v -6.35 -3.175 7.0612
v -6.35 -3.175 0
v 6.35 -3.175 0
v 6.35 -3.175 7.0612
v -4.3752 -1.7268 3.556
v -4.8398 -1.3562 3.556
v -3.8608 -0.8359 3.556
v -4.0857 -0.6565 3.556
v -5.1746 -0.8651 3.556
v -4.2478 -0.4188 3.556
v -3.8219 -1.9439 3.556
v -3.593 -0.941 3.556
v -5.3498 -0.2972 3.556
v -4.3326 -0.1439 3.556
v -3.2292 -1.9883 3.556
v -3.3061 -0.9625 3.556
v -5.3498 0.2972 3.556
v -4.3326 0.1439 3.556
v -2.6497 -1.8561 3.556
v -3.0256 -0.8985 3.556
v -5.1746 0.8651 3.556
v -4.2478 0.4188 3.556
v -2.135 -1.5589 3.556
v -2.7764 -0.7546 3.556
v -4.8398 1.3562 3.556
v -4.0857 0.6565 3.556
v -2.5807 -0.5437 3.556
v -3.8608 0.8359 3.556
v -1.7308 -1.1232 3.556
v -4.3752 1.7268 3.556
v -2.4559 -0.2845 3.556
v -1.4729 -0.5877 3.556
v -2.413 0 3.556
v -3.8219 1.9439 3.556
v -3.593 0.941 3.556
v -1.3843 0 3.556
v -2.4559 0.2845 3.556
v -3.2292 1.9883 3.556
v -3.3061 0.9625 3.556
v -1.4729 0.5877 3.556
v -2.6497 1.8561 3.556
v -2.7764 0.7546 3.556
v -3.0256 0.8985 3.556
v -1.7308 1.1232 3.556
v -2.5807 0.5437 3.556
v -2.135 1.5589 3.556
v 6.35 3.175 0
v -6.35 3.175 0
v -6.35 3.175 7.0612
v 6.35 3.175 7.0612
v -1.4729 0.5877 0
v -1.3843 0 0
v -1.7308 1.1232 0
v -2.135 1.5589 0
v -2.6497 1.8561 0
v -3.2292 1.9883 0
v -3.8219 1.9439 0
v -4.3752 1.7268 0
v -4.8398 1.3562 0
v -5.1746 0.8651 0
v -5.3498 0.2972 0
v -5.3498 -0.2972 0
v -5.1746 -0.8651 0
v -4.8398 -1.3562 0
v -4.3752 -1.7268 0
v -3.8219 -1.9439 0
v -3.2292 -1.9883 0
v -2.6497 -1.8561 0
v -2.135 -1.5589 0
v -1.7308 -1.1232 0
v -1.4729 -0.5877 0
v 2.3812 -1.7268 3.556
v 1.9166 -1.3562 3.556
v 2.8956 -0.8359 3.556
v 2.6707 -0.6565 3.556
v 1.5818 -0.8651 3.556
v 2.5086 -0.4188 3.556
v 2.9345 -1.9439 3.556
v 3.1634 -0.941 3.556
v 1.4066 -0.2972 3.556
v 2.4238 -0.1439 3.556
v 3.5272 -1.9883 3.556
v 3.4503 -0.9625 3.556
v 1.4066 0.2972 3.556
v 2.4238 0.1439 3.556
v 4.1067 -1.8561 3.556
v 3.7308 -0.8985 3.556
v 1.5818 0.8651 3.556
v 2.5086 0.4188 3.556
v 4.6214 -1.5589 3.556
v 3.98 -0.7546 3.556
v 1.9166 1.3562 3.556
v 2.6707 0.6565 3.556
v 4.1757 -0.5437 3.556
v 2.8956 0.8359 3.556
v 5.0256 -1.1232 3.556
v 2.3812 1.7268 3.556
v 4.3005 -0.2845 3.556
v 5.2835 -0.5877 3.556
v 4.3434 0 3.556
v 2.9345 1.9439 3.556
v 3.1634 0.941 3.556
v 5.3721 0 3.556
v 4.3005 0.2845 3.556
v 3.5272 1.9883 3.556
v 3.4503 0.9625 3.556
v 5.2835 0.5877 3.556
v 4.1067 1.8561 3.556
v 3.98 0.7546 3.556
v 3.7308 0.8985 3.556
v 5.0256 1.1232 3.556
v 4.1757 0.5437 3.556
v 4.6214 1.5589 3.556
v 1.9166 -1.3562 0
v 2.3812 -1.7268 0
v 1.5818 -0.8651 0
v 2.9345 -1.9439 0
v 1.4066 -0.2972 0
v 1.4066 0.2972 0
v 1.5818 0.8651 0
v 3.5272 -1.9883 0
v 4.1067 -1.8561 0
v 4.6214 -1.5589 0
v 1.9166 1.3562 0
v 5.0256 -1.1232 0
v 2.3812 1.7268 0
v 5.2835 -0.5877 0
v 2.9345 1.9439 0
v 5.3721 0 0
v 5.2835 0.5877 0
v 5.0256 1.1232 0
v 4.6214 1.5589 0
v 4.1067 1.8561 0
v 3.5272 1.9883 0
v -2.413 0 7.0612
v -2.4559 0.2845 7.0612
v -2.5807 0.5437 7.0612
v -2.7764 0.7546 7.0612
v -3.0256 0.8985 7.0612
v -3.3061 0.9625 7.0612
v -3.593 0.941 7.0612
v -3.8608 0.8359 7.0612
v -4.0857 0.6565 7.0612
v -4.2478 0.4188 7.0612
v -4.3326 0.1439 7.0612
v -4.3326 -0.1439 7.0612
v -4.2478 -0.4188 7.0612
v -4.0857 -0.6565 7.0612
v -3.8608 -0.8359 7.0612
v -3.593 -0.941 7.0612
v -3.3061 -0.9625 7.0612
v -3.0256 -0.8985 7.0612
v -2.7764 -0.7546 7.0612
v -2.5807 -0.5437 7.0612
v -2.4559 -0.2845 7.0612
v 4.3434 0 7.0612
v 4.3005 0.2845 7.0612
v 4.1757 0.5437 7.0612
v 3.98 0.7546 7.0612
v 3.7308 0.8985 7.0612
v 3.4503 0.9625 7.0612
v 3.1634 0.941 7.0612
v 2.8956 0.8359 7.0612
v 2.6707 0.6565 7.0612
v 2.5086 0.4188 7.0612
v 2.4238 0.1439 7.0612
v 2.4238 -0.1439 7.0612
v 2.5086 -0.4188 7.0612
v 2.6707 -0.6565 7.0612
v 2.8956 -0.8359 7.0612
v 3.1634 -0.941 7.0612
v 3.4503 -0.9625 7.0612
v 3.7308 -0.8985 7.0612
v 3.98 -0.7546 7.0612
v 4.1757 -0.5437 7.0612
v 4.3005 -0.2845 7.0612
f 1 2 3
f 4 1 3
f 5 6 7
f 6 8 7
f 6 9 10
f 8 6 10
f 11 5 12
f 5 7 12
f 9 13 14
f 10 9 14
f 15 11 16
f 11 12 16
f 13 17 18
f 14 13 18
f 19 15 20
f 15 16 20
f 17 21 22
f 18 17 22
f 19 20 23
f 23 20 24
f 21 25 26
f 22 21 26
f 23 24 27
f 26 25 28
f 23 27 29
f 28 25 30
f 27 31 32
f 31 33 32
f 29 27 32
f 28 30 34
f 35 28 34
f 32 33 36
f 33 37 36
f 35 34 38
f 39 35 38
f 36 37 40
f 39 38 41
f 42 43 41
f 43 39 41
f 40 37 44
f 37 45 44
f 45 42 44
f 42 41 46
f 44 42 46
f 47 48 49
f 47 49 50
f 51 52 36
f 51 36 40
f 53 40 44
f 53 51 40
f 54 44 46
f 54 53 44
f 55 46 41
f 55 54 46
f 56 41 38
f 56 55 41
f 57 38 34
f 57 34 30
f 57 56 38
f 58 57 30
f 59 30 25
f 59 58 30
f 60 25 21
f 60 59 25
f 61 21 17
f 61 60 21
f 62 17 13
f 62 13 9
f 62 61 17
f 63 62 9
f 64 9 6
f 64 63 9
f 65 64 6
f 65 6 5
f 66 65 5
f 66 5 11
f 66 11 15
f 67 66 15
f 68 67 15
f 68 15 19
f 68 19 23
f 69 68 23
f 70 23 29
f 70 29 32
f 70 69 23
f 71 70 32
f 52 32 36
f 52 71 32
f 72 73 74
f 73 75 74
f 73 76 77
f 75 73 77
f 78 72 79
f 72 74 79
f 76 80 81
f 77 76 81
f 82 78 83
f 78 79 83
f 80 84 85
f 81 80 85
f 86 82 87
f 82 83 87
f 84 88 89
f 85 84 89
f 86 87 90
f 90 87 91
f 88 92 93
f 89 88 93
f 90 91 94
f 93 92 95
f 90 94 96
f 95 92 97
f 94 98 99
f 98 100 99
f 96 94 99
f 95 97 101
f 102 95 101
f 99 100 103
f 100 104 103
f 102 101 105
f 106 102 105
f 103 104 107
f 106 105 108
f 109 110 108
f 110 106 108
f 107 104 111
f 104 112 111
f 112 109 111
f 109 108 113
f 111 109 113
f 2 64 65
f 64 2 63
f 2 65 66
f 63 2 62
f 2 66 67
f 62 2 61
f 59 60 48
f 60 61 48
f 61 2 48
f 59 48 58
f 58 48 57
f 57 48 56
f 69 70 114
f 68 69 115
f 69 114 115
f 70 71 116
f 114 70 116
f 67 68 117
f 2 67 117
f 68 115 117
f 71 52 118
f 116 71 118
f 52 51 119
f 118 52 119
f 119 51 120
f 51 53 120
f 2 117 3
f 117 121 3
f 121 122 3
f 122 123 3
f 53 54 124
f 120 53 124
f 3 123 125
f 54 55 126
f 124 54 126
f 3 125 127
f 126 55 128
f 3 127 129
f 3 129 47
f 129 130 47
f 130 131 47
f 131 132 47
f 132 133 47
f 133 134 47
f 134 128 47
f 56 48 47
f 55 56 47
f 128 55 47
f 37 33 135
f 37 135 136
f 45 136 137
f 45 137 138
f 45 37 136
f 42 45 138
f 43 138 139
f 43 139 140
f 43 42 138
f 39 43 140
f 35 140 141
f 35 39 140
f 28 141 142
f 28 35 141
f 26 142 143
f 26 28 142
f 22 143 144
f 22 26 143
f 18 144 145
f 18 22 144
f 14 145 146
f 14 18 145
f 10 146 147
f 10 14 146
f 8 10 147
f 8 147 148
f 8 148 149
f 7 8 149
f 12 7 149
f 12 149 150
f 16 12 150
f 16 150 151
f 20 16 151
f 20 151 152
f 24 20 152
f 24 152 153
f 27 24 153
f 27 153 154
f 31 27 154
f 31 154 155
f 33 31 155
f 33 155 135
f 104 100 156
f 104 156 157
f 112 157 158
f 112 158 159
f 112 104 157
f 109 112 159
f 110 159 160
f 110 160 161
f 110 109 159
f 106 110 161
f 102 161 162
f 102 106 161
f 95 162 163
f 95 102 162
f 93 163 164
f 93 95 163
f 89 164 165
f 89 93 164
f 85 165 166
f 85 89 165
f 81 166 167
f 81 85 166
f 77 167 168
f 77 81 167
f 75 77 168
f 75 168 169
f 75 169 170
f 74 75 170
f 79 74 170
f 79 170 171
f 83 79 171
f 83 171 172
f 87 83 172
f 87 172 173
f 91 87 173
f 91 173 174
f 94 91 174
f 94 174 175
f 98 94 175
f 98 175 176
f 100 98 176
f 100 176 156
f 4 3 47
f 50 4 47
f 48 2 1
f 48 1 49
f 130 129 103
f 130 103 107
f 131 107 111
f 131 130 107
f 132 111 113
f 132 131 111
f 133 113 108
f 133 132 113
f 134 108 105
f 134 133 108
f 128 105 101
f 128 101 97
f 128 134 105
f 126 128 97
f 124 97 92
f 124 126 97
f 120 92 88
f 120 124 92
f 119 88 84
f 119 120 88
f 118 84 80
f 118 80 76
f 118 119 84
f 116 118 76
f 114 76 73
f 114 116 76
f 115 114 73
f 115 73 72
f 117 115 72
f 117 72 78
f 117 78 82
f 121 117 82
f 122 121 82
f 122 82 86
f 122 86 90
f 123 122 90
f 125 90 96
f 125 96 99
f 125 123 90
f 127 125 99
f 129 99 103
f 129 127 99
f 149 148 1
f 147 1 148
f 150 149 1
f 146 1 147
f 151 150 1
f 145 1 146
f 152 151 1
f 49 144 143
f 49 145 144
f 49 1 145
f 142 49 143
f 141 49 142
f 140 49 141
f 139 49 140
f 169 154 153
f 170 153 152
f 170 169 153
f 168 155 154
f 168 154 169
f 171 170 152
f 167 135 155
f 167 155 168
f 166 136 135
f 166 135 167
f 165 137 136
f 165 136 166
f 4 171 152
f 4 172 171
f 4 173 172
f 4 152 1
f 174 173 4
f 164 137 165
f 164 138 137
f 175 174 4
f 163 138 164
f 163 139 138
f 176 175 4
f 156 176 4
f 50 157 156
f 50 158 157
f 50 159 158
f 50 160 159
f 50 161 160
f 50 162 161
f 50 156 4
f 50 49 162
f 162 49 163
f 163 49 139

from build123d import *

# Parameters (mm, degrees)
SKETCH1_W           = 12.7
SKETCH1_H           = 6.35
SKETCH1_R           = 0.9652
BOSS_EXTRUDE1_DEPTH = 7.0612
SKETCH1_3_R         = 1.9939
SKETCH1_3_R_2       = 0.9652
CUT_EXTRUDE1_DEPTH  = 3.556


with BuildPart() as part:
    # Sketch1 → Boss-Extrude1 (new body)
    with BuildSketch(Plane.XY):
        Rectangle(SKETCH1_W, SKETCH1_H)
        with Locations((-3.3782, 0)):
            Circle(SKETCH1_R, mode=Mode.SUBTRACT)
        with Locations((3.3782, 0)):
            Circle(SKETCH1_R, mode=Mode.SUBTRACT)
    extrude(amount=BOSS_EXTRUDE1_DEPTH)

    # Sketch1<3> → Cut-Extrude1 (cut)
    # profile 1 of 2: a face of its own
    with BuildSketch(Plane.XY):
        with Locations((-3.3782, 0)):
            Circle(SKETCH1_3_R)
        with Locations((-3.3782, 0)):
            Circle(SKETCH1_3_R_2, mode=Mode.SUBTRACT)
    # profile 2 of 2: a face of its own
    with BuildSketch(Plane.XY):
        with Locations((3.3782, 0)):
            Circle(SKETCH1_3_R)
        with Locations((3.3782, 0)):
            Circle(SKETCH1_3_R_2, mode=Mode.SUBTRACT)
    extrude(amount=CUT_EXTRUDE1_DEPTH, mode=Mode.SUBTRACT)


solid = part.part
